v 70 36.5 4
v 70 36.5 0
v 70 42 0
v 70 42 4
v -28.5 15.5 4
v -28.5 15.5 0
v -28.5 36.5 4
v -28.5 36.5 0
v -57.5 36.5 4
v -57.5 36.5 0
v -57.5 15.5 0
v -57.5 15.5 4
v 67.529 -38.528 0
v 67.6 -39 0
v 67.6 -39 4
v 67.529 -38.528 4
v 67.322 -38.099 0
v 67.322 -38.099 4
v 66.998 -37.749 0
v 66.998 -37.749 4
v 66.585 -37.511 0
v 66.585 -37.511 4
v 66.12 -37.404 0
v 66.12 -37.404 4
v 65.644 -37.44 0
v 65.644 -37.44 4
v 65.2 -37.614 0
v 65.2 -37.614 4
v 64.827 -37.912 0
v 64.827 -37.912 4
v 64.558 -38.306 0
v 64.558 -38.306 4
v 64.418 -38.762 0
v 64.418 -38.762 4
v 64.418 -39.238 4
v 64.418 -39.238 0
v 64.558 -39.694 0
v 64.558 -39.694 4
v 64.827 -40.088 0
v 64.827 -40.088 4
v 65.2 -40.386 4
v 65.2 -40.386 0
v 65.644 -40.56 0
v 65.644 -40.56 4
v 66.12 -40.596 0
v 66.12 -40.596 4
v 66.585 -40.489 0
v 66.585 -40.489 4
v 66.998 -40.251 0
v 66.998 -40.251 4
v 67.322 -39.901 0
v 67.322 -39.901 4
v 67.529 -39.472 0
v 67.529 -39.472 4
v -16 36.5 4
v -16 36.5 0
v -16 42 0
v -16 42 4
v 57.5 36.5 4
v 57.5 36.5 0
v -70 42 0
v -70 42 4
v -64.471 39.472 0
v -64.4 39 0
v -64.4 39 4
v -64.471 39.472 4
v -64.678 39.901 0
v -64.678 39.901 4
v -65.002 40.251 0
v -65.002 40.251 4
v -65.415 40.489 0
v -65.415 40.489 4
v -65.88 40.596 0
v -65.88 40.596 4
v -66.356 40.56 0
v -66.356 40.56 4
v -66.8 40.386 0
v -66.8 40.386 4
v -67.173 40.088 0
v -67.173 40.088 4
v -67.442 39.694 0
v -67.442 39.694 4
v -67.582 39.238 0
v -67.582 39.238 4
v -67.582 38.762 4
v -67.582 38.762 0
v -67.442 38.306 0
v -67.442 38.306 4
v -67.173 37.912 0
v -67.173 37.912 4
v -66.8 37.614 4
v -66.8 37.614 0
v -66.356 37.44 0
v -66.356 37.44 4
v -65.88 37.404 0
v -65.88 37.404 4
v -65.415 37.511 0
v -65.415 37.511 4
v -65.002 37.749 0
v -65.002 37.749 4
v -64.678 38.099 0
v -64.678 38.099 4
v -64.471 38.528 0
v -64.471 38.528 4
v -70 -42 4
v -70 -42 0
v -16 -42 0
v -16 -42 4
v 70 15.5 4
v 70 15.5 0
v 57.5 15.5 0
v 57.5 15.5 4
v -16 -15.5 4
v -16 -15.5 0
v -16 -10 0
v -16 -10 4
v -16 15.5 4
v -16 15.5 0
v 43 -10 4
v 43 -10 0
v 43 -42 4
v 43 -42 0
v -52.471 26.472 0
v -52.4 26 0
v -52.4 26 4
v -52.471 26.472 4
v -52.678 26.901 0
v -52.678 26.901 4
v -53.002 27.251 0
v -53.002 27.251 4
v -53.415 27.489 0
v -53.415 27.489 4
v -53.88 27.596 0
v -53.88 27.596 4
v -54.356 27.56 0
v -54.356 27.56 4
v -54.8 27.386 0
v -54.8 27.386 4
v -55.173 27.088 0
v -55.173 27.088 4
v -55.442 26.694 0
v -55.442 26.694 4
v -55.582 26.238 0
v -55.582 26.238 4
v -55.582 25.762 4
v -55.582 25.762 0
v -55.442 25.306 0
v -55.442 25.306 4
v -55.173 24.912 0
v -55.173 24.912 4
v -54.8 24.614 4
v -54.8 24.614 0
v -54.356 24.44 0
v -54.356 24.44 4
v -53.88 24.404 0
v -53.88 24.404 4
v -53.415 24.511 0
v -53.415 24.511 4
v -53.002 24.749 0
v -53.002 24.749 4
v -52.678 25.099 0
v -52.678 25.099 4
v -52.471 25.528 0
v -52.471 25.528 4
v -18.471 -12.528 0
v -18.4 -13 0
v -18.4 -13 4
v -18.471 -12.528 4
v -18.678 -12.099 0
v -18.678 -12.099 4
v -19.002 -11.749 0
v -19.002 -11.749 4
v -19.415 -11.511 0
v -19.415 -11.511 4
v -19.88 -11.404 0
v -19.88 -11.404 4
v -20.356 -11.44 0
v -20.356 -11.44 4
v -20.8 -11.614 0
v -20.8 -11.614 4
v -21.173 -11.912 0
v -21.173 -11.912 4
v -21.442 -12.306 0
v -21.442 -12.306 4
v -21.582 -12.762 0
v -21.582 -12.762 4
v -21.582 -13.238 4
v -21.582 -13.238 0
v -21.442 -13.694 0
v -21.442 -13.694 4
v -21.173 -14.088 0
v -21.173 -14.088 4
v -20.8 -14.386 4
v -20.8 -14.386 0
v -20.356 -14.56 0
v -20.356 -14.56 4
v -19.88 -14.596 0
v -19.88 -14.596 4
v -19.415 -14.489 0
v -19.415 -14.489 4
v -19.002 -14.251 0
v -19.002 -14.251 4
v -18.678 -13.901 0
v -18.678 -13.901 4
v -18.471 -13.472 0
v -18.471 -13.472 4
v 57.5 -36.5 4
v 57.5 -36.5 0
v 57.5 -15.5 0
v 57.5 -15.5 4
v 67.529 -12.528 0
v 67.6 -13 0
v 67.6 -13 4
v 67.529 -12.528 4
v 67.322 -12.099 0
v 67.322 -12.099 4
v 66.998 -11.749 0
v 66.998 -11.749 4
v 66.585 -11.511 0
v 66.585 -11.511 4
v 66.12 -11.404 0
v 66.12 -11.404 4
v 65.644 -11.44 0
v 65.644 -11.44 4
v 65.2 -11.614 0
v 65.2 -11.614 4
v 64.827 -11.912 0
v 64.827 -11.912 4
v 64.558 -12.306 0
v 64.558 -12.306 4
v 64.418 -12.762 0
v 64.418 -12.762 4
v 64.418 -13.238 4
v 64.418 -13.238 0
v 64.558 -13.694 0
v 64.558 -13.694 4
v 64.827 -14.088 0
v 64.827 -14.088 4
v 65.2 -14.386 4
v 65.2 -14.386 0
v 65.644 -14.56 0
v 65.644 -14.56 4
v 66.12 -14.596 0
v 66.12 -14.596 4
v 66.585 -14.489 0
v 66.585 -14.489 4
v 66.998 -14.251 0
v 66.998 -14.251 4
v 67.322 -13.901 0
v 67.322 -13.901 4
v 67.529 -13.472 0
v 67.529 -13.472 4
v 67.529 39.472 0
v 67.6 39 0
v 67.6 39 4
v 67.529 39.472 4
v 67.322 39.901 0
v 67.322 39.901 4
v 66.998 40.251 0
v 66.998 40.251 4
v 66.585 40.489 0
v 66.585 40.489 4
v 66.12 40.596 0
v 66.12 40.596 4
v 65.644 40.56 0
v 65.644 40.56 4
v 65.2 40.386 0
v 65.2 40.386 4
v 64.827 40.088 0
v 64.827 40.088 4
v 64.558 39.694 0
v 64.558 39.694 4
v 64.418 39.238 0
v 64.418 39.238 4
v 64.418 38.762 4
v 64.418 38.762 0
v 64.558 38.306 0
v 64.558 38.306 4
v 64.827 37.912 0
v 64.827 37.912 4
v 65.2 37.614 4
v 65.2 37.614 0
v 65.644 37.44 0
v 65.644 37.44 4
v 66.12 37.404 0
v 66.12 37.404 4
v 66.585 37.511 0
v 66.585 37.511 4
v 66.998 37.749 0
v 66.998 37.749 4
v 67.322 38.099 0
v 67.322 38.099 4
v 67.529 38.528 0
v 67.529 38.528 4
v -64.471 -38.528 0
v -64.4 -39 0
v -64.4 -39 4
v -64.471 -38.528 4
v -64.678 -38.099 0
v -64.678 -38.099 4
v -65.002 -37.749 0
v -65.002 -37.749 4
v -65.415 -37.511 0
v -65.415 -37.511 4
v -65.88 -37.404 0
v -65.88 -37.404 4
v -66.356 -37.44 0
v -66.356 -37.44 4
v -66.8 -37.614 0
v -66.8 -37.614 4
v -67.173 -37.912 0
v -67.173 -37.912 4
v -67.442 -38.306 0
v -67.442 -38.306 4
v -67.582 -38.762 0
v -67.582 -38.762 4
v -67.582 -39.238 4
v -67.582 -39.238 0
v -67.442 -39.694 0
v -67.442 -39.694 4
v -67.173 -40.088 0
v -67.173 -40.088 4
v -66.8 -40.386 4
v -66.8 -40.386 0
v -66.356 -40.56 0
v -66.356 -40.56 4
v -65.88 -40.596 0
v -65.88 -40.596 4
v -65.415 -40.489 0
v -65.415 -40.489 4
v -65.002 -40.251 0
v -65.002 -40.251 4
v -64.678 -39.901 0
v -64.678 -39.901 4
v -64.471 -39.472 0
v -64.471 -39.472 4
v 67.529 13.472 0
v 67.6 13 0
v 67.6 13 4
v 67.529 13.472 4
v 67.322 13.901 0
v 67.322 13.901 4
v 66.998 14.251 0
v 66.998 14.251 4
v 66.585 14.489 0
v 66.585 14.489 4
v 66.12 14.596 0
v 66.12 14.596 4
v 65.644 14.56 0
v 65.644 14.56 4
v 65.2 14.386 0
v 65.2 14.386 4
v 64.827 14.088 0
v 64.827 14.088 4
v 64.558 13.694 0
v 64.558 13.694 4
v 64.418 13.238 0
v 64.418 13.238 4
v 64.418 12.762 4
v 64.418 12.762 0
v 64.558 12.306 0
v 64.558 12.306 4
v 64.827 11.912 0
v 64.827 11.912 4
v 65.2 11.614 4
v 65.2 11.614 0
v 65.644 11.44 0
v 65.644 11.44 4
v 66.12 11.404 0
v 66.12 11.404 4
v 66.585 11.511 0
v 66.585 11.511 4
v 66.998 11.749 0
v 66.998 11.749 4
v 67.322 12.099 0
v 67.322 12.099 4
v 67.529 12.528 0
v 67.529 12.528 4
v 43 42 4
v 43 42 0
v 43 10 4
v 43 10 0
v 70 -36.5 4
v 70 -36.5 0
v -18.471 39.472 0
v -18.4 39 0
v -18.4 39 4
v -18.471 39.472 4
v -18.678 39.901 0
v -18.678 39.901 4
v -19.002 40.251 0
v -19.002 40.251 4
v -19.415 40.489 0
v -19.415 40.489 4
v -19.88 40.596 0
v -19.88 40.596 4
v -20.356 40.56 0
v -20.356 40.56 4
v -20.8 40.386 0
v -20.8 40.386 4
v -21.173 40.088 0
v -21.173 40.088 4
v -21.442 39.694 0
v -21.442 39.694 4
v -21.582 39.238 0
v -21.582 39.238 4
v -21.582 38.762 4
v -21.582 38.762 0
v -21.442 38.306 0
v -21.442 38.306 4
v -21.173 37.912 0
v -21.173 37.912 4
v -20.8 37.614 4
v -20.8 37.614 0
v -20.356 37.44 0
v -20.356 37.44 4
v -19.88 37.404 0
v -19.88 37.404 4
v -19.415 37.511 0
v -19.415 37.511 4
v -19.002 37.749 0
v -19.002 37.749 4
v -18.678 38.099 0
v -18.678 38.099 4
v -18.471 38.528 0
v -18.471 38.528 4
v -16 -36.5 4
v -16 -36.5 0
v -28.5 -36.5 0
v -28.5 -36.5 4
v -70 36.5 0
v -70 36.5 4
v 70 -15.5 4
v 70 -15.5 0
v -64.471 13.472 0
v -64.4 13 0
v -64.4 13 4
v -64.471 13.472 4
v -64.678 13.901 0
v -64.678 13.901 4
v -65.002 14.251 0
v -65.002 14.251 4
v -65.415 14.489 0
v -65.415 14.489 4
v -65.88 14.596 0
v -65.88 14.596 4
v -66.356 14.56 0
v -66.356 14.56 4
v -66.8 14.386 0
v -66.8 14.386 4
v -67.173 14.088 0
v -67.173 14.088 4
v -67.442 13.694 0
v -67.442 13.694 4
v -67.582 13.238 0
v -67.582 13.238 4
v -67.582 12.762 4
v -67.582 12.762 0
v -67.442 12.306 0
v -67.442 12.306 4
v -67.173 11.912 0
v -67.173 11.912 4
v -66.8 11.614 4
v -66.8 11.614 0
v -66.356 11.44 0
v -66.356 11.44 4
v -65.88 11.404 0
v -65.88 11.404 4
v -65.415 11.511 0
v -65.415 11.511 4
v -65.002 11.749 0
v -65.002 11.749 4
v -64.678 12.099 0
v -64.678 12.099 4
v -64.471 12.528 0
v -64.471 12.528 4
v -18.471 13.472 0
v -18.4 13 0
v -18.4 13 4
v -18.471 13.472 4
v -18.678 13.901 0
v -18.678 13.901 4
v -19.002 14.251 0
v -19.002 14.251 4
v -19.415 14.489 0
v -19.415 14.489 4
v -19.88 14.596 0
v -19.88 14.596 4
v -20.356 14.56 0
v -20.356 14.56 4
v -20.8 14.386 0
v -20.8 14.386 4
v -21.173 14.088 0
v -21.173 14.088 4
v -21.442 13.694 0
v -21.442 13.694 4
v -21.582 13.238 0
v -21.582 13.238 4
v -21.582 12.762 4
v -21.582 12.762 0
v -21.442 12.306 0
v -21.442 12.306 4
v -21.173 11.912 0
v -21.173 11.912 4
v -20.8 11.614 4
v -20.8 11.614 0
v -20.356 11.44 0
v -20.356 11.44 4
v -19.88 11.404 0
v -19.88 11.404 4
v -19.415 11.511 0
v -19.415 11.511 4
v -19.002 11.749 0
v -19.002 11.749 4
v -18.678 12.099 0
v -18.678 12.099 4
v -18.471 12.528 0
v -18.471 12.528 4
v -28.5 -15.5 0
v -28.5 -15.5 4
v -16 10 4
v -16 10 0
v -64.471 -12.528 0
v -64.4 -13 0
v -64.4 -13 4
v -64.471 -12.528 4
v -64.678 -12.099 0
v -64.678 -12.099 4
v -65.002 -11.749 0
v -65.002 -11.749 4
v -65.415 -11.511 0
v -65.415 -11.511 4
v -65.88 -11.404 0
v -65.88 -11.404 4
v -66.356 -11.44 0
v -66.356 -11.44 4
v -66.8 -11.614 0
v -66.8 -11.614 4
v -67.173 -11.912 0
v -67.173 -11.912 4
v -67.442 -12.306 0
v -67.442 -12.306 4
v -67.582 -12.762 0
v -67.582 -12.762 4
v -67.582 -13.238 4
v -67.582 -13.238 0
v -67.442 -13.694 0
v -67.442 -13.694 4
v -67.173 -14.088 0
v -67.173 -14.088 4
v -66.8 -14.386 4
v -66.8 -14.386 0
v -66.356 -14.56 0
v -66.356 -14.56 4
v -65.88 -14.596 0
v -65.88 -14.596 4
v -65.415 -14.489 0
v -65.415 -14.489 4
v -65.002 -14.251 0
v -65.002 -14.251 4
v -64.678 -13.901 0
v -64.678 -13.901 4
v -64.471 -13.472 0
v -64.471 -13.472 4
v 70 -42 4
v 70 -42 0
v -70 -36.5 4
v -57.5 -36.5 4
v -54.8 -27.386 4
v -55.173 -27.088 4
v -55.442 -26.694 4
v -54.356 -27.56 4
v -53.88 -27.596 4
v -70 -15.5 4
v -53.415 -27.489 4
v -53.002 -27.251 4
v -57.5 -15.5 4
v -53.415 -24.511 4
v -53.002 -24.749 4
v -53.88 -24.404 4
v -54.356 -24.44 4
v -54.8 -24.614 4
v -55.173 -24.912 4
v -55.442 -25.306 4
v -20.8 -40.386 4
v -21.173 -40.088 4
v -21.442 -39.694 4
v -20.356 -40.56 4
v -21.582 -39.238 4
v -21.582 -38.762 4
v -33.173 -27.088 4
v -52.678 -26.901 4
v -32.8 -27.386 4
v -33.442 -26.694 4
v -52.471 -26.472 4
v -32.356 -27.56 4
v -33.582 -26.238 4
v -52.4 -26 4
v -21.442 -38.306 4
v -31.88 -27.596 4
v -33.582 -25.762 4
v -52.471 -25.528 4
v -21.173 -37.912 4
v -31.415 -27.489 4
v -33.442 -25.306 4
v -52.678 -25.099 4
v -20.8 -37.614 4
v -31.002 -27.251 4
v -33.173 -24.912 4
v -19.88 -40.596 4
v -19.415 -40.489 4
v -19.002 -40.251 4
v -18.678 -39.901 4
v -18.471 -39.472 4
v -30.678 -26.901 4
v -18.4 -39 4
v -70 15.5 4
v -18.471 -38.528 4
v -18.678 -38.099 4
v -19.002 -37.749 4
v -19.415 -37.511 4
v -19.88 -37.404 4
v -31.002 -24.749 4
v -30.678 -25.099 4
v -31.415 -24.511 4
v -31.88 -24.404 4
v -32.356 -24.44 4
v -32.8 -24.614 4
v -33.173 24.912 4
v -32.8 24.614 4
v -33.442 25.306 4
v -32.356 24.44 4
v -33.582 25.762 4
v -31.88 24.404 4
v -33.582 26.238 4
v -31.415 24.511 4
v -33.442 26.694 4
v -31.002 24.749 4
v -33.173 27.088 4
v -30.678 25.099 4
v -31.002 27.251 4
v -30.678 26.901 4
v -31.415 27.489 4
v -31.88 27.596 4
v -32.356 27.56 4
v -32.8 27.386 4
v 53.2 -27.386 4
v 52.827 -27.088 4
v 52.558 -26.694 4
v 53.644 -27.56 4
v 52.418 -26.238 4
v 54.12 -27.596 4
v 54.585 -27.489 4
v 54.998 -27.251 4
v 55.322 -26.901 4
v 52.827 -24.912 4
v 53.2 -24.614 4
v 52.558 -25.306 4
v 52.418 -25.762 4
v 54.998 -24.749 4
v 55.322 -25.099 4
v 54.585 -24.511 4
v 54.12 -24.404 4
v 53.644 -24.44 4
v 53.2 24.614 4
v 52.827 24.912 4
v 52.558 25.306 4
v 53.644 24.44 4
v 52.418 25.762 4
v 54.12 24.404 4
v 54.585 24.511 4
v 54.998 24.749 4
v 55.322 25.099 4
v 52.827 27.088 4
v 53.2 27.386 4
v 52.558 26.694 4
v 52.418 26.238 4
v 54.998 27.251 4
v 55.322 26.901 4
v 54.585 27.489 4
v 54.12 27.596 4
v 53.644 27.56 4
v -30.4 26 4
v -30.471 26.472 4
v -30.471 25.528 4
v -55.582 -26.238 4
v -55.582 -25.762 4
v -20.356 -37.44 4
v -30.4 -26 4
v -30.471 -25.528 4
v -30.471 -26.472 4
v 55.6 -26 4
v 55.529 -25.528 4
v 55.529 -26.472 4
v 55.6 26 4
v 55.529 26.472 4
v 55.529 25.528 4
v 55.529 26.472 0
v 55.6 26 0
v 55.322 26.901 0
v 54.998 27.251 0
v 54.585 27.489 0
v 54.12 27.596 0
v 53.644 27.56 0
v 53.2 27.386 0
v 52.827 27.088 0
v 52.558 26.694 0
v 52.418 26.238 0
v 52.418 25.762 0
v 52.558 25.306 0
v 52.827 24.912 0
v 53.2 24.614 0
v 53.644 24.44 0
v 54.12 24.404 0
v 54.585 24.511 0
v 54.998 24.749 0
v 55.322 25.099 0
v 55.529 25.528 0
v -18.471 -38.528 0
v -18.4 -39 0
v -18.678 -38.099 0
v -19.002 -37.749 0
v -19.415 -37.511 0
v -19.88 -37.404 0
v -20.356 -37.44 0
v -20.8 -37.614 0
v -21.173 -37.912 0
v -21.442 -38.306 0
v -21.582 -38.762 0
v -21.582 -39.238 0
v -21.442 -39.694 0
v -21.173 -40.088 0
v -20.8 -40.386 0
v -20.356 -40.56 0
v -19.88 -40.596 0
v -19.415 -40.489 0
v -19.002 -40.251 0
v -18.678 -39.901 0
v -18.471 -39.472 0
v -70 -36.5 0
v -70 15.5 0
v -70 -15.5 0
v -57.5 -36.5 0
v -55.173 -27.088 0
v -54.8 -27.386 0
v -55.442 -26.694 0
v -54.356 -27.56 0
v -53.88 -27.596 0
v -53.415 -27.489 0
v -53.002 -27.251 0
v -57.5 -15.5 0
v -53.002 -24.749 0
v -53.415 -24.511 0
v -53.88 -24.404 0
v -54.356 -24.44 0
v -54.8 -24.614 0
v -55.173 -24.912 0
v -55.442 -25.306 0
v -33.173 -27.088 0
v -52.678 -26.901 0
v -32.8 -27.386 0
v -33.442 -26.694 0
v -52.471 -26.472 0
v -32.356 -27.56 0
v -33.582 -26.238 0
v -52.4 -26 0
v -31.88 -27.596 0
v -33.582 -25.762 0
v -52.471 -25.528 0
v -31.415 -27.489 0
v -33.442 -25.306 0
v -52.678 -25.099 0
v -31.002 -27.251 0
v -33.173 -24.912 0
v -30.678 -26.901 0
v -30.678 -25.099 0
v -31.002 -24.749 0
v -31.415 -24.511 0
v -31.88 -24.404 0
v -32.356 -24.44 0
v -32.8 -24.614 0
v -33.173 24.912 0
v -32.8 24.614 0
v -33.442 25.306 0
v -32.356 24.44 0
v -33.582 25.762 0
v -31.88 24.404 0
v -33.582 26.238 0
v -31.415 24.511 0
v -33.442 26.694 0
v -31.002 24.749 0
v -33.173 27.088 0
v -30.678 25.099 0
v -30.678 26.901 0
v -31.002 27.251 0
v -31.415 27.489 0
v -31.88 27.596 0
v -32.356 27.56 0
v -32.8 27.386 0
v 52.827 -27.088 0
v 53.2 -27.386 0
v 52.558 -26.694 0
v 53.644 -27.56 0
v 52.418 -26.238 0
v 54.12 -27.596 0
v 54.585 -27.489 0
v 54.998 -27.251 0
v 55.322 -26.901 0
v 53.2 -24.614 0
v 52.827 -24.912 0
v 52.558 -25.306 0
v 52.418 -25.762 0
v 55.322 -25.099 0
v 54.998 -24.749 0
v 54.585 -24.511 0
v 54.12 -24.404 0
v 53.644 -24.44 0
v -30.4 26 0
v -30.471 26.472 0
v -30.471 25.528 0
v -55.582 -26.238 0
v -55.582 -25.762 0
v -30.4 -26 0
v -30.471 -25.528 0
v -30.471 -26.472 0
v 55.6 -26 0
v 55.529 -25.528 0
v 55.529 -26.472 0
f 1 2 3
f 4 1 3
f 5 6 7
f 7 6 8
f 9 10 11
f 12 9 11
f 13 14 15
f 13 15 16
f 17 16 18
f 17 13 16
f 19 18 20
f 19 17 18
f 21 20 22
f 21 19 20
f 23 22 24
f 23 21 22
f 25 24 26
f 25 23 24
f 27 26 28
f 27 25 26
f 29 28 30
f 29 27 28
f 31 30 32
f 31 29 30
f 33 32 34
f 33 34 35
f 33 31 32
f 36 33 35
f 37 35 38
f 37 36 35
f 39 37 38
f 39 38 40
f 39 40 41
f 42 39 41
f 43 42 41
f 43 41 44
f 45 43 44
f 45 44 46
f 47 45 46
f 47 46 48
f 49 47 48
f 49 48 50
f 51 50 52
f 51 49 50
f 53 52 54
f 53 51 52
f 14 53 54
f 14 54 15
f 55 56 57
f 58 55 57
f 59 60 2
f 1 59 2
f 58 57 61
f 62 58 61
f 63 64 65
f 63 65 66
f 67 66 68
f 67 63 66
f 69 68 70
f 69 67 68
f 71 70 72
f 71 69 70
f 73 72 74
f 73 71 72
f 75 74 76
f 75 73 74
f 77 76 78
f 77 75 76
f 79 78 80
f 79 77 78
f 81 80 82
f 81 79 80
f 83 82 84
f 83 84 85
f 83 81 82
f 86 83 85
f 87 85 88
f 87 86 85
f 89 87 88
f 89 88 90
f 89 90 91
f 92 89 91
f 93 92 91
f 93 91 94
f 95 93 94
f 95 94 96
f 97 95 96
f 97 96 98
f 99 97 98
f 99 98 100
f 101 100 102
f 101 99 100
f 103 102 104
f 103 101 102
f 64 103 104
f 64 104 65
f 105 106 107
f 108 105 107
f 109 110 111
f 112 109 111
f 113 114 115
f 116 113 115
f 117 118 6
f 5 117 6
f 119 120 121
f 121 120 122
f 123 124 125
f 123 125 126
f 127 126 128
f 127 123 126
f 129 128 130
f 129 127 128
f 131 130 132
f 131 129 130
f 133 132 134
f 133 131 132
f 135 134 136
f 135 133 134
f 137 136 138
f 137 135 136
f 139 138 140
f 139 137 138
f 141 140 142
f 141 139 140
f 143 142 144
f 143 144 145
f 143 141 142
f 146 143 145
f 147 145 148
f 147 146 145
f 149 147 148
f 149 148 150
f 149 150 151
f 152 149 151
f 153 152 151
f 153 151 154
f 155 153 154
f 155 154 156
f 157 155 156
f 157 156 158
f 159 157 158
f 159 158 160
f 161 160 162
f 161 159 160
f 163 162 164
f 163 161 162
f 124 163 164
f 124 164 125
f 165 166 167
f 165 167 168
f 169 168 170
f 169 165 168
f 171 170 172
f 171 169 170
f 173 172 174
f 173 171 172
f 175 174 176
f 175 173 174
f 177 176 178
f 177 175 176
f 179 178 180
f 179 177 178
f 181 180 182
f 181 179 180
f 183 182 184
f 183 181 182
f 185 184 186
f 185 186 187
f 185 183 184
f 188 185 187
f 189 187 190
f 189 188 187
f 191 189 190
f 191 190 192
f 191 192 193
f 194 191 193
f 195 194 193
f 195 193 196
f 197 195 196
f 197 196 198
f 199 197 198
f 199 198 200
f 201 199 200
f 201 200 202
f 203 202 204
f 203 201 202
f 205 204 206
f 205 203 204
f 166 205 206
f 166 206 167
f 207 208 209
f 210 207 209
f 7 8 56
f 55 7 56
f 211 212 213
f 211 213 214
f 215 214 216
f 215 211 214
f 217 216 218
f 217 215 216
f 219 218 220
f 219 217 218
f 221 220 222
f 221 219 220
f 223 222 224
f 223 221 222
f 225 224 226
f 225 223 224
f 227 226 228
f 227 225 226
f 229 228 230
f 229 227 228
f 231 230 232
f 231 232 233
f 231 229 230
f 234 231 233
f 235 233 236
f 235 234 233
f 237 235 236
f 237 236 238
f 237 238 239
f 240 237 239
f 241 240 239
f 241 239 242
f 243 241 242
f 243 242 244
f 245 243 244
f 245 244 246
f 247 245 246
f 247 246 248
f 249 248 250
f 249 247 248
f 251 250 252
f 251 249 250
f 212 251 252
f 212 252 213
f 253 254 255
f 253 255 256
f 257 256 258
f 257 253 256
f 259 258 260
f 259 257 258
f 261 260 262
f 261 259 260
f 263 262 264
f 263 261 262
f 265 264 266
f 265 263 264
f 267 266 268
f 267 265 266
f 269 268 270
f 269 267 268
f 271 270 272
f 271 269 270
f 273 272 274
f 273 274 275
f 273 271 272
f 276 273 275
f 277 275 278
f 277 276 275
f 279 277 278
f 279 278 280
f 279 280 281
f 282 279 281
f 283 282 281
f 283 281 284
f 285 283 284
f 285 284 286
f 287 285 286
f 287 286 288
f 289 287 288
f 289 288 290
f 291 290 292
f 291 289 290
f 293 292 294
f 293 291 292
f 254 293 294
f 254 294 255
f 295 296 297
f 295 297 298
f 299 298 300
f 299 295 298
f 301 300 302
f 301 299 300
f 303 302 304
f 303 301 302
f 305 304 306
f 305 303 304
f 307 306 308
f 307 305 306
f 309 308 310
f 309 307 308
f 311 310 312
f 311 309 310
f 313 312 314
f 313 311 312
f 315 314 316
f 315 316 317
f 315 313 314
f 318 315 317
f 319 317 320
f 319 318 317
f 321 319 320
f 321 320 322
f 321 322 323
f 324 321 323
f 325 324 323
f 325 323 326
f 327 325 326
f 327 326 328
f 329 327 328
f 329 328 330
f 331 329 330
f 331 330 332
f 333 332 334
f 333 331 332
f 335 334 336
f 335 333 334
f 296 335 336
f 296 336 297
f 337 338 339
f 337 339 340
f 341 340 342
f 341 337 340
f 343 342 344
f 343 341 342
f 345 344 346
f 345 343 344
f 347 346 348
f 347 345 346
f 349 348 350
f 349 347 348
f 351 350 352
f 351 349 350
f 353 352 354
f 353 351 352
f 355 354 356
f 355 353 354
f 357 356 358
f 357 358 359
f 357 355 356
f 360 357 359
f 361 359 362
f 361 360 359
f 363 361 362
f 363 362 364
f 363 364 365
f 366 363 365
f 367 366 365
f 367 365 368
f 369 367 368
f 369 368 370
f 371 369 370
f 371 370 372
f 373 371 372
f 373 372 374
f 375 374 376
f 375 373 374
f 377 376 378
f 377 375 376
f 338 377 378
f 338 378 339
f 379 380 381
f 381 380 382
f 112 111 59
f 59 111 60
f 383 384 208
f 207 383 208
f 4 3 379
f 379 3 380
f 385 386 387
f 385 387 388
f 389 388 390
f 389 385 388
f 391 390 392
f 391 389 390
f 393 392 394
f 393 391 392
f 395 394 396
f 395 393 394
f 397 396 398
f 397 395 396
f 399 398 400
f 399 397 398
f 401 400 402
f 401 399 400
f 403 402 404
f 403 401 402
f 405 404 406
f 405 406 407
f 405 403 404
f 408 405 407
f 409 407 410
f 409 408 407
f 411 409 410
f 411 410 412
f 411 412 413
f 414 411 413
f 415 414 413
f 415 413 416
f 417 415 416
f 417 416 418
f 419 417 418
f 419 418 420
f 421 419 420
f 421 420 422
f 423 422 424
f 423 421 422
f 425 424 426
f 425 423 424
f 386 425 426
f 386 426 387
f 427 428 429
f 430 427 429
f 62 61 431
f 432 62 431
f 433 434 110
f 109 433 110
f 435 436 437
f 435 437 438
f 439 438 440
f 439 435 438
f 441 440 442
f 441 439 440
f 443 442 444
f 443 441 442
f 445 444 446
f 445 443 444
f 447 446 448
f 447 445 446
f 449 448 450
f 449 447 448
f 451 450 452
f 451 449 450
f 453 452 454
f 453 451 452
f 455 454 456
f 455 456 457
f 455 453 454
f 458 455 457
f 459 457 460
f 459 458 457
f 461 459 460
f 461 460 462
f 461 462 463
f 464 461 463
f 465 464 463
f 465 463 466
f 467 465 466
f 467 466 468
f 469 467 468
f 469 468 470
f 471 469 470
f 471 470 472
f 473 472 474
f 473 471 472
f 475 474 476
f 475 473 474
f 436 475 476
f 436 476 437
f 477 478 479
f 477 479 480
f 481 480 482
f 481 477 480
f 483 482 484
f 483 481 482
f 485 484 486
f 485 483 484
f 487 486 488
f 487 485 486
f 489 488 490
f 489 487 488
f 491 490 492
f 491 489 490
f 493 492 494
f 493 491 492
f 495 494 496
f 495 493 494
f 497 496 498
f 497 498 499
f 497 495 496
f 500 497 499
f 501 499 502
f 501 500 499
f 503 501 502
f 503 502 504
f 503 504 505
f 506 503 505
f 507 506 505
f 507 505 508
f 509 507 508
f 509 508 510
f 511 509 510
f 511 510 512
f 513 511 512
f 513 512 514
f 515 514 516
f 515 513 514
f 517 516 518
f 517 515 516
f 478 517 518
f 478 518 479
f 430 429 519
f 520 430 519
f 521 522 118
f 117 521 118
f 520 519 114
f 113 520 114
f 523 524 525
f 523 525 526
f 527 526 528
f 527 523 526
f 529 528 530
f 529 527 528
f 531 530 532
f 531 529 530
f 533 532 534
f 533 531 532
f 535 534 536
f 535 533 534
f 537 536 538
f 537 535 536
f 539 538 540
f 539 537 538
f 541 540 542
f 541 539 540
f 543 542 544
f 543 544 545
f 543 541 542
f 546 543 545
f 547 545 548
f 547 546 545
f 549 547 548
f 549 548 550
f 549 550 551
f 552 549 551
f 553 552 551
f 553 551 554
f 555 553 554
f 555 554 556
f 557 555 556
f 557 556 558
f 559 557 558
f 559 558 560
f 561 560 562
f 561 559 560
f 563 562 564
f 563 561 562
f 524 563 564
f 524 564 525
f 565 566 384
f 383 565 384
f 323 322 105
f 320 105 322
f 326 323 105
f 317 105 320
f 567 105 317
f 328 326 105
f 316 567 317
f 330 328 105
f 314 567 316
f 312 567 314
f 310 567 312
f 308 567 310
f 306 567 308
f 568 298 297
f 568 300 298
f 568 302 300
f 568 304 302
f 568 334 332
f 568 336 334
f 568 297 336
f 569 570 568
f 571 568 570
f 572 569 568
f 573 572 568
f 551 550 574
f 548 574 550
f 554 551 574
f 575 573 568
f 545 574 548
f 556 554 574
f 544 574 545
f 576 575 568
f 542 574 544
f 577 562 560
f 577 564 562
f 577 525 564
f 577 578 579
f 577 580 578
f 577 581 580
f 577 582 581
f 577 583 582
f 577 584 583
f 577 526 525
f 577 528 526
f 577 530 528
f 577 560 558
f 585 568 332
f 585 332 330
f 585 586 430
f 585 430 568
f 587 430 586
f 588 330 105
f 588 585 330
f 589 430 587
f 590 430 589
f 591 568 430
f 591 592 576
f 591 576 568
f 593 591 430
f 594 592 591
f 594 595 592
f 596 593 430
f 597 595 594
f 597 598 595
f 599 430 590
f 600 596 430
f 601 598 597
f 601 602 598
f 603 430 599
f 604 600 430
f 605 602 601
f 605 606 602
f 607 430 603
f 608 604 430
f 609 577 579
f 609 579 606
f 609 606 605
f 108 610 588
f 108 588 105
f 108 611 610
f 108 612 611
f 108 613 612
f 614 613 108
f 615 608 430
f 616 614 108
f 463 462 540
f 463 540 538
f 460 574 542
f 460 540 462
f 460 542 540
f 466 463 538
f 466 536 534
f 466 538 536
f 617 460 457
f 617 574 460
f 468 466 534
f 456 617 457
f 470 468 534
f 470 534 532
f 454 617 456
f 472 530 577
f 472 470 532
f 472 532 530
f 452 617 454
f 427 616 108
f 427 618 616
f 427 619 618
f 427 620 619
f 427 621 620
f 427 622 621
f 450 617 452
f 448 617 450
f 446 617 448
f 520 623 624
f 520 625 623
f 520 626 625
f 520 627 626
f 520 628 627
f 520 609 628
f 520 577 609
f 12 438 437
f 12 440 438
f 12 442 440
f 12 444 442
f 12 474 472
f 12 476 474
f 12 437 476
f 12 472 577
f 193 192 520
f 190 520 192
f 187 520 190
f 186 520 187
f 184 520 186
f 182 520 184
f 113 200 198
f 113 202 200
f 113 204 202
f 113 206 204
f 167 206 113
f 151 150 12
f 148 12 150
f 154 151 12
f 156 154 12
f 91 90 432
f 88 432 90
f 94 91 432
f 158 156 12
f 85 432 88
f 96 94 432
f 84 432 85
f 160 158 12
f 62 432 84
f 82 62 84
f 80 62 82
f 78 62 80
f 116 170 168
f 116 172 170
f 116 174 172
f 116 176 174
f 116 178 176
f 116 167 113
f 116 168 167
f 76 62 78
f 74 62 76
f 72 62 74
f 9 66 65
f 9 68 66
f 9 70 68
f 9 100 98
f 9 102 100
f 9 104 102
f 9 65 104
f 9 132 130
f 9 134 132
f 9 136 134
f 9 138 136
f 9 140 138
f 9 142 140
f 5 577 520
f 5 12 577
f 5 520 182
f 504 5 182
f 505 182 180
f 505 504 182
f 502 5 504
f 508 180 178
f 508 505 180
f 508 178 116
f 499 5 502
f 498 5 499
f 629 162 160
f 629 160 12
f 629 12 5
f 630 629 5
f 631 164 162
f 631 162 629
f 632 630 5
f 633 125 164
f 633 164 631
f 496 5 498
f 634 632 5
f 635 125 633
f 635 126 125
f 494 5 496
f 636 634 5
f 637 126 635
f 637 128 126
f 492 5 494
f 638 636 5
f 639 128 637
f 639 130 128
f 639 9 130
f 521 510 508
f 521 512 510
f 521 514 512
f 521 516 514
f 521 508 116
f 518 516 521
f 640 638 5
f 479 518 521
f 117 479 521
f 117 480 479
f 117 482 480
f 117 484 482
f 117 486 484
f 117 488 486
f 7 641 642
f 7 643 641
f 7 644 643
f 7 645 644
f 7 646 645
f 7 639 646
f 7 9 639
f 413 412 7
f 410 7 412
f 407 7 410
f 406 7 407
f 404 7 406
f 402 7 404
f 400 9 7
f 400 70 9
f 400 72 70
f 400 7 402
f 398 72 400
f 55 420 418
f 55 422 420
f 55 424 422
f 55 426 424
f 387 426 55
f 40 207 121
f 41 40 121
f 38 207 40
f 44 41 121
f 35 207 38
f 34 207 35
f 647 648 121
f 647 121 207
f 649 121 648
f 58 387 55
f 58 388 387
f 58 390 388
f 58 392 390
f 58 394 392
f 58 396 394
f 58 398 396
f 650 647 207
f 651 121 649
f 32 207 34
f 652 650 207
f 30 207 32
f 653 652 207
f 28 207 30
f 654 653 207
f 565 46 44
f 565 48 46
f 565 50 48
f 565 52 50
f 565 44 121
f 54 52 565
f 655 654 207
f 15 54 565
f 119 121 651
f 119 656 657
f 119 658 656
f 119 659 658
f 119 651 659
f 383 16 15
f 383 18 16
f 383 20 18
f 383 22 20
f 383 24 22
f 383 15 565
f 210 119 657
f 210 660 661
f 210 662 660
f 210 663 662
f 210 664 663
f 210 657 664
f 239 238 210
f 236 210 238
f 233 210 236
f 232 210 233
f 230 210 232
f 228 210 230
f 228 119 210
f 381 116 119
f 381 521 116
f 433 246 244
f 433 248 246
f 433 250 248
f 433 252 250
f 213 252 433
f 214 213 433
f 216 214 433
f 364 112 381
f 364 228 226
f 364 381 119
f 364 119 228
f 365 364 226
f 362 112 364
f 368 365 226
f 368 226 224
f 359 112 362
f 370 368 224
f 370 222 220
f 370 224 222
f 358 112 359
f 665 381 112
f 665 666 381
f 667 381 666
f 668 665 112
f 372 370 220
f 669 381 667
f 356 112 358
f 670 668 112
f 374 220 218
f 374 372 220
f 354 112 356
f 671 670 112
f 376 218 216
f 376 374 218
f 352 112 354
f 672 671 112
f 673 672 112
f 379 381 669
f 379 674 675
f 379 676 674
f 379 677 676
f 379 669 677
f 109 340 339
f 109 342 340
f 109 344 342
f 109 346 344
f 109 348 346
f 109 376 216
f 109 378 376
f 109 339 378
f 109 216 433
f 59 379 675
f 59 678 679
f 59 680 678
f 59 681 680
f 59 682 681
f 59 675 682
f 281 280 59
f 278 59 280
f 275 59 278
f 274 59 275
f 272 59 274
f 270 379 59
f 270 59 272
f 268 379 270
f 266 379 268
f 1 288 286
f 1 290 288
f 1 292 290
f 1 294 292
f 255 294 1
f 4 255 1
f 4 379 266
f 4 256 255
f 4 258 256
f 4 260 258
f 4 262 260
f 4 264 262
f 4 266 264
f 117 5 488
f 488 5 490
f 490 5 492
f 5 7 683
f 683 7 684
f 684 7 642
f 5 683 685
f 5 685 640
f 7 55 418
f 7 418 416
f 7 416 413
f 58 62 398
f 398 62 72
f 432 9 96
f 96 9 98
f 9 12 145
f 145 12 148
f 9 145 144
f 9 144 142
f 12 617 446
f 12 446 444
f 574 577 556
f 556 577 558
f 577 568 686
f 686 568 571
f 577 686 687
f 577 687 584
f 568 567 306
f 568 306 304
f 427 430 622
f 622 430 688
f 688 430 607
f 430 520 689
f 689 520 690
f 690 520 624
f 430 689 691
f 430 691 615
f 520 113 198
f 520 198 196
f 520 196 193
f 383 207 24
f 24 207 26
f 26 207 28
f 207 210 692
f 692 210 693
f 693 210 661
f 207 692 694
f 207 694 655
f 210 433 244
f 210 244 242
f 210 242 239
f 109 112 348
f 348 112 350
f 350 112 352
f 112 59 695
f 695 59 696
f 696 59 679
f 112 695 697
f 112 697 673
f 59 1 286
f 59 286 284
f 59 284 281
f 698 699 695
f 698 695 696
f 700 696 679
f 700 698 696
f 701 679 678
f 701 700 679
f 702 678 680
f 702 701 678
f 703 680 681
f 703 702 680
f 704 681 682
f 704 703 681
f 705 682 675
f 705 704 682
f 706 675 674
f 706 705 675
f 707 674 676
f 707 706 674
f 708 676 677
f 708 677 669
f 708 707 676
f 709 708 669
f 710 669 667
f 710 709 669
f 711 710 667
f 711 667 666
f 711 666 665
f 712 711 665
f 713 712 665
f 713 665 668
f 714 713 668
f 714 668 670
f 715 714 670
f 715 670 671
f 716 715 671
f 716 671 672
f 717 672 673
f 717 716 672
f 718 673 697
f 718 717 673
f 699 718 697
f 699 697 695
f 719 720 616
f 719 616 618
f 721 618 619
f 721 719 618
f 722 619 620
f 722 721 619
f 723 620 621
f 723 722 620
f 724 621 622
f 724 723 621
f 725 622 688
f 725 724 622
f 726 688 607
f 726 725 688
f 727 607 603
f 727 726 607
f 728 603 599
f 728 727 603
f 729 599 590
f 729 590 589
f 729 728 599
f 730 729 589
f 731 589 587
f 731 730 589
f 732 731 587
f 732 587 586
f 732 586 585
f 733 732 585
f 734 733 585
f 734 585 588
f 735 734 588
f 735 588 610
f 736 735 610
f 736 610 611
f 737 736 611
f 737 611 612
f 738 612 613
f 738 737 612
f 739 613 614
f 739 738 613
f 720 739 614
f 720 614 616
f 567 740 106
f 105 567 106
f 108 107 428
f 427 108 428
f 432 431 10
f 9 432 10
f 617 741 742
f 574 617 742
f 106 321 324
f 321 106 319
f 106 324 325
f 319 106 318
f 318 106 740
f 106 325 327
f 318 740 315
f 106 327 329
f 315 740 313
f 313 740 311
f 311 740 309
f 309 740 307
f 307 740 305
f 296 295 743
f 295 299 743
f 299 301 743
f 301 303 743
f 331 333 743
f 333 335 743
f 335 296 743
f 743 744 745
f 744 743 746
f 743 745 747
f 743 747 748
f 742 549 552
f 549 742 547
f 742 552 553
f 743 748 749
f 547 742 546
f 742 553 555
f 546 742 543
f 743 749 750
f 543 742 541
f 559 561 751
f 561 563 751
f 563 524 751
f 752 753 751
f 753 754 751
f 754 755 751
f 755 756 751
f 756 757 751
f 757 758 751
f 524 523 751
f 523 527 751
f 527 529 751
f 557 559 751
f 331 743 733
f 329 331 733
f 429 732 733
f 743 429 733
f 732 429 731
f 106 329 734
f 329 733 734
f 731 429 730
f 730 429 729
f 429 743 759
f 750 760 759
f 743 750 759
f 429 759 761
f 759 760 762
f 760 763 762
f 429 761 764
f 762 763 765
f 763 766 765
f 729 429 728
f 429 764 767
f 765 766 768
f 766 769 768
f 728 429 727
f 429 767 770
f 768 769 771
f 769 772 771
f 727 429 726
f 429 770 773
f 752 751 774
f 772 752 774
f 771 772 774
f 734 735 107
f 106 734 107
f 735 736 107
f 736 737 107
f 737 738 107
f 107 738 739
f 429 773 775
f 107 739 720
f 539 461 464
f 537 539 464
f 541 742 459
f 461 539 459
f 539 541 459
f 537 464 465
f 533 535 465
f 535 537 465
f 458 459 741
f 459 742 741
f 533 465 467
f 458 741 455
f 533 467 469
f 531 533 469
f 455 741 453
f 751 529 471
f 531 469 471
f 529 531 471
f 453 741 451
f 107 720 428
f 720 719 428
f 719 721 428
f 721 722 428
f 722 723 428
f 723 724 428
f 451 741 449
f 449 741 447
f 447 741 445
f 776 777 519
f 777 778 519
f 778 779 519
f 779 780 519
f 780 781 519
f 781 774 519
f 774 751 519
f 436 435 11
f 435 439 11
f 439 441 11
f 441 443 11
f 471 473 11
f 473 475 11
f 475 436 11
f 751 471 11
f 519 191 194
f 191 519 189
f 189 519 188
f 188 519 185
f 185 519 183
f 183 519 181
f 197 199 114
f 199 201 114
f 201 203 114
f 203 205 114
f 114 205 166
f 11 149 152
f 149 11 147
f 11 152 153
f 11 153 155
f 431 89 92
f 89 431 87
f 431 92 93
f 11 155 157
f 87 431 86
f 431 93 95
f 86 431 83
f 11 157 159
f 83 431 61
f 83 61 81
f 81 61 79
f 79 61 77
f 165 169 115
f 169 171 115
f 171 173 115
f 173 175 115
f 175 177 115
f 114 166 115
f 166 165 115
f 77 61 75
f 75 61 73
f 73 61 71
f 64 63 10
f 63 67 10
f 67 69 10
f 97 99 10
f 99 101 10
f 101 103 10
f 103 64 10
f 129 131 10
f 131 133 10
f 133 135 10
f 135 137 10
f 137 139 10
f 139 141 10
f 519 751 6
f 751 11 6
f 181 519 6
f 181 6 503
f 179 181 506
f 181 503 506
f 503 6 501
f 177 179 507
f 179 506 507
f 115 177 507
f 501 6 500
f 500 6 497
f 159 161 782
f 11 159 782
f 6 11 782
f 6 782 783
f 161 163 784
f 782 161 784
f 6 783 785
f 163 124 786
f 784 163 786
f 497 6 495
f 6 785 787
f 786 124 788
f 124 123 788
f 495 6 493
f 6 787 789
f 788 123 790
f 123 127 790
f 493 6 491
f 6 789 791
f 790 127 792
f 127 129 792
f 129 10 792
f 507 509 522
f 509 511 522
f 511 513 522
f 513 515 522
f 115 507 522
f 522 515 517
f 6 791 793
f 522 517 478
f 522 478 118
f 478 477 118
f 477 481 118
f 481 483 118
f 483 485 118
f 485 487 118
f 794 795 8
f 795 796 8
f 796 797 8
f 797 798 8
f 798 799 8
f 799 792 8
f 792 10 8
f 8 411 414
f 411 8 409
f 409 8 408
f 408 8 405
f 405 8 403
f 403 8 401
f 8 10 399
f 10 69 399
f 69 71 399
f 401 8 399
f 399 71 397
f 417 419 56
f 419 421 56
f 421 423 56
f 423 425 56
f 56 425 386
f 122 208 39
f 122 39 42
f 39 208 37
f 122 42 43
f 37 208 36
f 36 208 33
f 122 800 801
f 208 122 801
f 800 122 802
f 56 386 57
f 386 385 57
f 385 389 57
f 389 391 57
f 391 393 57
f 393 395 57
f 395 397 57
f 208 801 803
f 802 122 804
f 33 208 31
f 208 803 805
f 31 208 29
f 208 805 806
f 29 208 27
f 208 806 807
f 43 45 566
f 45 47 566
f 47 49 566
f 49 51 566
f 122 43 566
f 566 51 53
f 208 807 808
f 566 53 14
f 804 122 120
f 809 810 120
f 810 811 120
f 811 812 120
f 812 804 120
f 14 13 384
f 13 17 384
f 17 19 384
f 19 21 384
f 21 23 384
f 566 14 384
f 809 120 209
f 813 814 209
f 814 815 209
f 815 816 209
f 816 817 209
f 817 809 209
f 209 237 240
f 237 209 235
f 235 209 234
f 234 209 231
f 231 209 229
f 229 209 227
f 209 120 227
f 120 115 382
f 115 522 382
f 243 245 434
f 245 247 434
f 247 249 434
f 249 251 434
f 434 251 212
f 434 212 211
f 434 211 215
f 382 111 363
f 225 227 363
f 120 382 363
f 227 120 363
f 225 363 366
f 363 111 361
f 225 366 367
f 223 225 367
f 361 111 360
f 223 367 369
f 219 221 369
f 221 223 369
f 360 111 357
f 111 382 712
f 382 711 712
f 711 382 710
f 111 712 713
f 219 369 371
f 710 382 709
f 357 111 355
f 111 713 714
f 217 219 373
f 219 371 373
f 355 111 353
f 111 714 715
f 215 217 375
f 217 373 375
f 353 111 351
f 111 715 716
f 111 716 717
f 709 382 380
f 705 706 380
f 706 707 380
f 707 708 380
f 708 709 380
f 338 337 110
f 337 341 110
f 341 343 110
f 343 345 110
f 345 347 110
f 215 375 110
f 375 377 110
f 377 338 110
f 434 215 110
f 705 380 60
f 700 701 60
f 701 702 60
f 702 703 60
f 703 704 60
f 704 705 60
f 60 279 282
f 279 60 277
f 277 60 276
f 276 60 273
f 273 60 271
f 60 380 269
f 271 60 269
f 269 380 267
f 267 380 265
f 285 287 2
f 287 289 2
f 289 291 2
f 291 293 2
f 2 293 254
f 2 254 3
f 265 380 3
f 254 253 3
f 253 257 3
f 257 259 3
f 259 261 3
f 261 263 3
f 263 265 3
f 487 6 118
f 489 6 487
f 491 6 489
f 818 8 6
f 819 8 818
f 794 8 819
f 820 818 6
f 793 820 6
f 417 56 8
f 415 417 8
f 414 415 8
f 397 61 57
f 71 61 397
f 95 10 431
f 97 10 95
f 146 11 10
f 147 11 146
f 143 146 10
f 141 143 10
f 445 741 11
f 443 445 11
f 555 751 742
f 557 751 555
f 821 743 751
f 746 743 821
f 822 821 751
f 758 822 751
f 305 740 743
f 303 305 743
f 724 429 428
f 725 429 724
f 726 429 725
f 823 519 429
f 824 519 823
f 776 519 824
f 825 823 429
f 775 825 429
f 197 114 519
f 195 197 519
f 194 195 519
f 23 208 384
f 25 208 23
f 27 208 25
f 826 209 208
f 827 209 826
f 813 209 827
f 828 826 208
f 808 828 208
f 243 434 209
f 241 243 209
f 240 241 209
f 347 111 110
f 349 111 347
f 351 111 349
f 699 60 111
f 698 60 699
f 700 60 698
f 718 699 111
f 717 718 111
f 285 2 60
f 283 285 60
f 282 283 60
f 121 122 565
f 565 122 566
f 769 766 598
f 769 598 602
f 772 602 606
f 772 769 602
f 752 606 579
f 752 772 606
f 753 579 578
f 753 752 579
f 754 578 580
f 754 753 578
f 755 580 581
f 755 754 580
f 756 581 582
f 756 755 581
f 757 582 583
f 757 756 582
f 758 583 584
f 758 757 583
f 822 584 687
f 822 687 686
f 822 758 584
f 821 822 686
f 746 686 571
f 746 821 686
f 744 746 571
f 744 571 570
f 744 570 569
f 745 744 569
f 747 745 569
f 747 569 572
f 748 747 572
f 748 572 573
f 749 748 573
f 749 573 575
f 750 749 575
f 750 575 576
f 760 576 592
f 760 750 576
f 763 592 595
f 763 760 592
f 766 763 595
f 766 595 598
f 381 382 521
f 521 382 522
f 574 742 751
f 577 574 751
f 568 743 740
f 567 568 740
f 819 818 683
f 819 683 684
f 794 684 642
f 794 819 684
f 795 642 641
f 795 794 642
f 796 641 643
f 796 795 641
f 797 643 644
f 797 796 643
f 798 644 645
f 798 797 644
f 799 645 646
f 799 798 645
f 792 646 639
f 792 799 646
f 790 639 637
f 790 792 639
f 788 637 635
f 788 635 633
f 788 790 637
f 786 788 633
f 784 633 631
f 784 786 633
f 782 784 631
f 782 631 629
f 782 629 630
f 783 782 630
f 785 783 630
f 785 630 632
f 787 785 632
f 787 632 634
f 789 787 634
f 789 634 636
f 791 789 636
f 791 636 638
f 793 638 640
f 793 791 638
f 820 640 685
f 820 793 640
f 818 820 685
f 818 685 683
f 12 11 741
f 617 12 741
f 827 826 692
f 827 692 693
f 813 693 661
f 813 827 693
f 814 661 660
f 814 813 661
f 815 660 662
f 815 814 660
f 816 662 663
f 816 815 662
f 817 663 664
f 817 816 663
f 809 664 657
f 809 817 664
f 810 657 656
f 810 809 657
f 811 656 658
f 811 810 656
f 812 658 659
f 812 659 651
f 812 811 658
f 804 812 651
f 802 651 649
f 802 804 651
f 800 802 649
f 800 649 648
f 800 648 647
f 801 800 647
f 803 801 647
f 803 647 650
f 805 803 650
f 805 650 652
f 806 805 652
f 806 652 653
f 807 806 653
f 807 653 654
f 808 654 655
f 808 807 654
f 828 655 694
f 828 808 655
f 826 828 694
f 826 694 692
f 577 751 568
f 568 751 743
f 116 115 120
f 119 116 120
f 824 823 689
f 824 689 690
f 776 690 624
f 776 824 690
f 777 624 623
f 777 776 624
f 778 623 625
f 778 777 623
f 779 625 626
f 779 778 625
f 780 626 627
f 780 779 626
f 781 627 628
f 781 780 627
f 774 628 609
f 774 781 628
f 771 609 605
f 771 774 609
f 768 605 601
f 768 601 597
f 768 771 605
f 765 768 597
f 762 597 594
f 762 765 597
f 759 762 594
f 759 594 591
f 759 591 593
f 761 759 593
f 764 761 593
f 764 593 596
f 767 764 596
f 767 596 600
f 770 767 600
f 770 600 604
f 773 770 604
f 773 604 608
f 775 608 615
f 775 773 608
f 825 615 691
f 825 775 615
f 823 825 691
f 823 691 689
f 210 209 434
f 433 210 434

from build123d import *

# Parameters (mm, degrees)
SKETCH_3_R      = 1.6
EXTRUDE_2_DEPTH = 4


with BuildPart() as part:
    # Эскиз3 → Бобышка-Вытянуть2 (new body)
    # profile 1 of 6: a face of its own
    with BuildSketch(Plane.XY):
        Polygon((-16, -10), (-70, -10), (-70, -15.5), (-57.5, -15.5), (-57.5, -36.5), (-70, -36.5), (-70, -42), (-16, -42), (-16, -36.5), (-28.5, -36.5), (-28.5, -15.5), (-16, -15.5), align=None)
        with Locations((-66, -39)):
            Circle(SKETCH_3_R, mode=Mode.SUBTRACT)
        with Locations((-54, -26)):
            Circle(SKETCH_3_R, mode=Mode.SUBTRACT)
        with Locations((-20, -39)):
            Circle(SKETCH_3_R, mode=Mode.SUBTRACT)
        with Locations((-32, -26)):
            Circle(SKETCH_3_R, mode=Mode.SUBTRACT)
        with Locations((-66, -13)):
            Circle(SKETCH_3_R, mode=Mode.SUBTRACT)
        with Locations((-20, -13)):
            Circle(SKETCH_3_R, mode=Mode.SUBTRACT)
    # profile 2 of 6: a face of its own
    with BuildSketch(Plane.XY):
        Polygon((70, -10), (43, -10), (43, -42), (70, -42), (70, -36.5), (57.5, -36.5), (57.5, -15.5), (70, -15.5), align=None)
        with Locations((66, -39)):
            Circle(SKETCH_3_R, mode=Mode.SUBTRACT)
        with Locations((54, -26)):
            Circle(SKETCH_3_R, mode=Mode.SUBTRACT)
        with Locations((66, -13)):
            Circle(SKETCH_3_R, mode=Mode.SUBTRACT)
    # profile 3 of 6: a face of its own
    with BuildSketch(Plane.XY):
        Polygon((-70, 10), (-70, -10), (-16, -10), (43, -10), (70, -10), (70, 10), (43, 10), (-16, 10), (-43, 10), align=None)
    # profile 4 of 6: a face of its own
    with BuildSketch(Plane.XY):
        Polygon((-43, 42), (-43, 10), (-16, 10), (-16, 15.5), (-28.5, 15.5), (-28.5, 36.5), (-16, 36.5), (-16, 42), align=None)
        with Locations((-20, 13)):
            Circle(SKETCH_3_R, mode=Mode.SUBTRACT)
        with Locations((-32, 26)):
            Circle(SKETCH_3_R, mode=Mode.SUBTRACT)
        with Locations((-20, 39)):
            Circle(SKETCH_3_R, mode=Mode.SUBTRACT)
    # profile 5 of 6: a face of its own
    with BuildSketch(Plane.XY):
        Polygon((-70, 15.5), (-70, 10), (-43, 10), (-43, 42), (-70, 42), (-70, 36.5), (-57.5, 36.5), (-57.5, 15.5), align=None)
        with Locations((-66, 13)):
            Circle(SKETCH_3_R, mode=Mode.SUBTRACT)
        with Locations((-54, 26)):
            Circle(SKETCH_3_R, mode=Mode.SUBTRACT)
        with Locations((-66, 39)):
            Circle(SKETCH_3_R, mode=Mode.SUBTRACT)
    # profile 6 of 6: a face of its own
    with BuildSketch(Plane.XY):
        Polygon((43, 10), (70, 10), (70, 15.5), (57.5, 15.5), (57.5, 36.5), (70, 36.5), (70, 42), (43, 42), align=None)
        with Locations((66, 13)):
            Circle(SKETCH_3_R, mode=Mode.SUBTRACT)
        with Locations((54, 26)):
            Circle(SKETCH_3_R, mode=Mode.SUBTRACT)
        with Locations((66, 39)):
            Circle(SKETCH_3_R, mode=Mode.SUBTRACT)
    extrude(amount=EXTRUDE_2_DEPTH)


solid = part.part
